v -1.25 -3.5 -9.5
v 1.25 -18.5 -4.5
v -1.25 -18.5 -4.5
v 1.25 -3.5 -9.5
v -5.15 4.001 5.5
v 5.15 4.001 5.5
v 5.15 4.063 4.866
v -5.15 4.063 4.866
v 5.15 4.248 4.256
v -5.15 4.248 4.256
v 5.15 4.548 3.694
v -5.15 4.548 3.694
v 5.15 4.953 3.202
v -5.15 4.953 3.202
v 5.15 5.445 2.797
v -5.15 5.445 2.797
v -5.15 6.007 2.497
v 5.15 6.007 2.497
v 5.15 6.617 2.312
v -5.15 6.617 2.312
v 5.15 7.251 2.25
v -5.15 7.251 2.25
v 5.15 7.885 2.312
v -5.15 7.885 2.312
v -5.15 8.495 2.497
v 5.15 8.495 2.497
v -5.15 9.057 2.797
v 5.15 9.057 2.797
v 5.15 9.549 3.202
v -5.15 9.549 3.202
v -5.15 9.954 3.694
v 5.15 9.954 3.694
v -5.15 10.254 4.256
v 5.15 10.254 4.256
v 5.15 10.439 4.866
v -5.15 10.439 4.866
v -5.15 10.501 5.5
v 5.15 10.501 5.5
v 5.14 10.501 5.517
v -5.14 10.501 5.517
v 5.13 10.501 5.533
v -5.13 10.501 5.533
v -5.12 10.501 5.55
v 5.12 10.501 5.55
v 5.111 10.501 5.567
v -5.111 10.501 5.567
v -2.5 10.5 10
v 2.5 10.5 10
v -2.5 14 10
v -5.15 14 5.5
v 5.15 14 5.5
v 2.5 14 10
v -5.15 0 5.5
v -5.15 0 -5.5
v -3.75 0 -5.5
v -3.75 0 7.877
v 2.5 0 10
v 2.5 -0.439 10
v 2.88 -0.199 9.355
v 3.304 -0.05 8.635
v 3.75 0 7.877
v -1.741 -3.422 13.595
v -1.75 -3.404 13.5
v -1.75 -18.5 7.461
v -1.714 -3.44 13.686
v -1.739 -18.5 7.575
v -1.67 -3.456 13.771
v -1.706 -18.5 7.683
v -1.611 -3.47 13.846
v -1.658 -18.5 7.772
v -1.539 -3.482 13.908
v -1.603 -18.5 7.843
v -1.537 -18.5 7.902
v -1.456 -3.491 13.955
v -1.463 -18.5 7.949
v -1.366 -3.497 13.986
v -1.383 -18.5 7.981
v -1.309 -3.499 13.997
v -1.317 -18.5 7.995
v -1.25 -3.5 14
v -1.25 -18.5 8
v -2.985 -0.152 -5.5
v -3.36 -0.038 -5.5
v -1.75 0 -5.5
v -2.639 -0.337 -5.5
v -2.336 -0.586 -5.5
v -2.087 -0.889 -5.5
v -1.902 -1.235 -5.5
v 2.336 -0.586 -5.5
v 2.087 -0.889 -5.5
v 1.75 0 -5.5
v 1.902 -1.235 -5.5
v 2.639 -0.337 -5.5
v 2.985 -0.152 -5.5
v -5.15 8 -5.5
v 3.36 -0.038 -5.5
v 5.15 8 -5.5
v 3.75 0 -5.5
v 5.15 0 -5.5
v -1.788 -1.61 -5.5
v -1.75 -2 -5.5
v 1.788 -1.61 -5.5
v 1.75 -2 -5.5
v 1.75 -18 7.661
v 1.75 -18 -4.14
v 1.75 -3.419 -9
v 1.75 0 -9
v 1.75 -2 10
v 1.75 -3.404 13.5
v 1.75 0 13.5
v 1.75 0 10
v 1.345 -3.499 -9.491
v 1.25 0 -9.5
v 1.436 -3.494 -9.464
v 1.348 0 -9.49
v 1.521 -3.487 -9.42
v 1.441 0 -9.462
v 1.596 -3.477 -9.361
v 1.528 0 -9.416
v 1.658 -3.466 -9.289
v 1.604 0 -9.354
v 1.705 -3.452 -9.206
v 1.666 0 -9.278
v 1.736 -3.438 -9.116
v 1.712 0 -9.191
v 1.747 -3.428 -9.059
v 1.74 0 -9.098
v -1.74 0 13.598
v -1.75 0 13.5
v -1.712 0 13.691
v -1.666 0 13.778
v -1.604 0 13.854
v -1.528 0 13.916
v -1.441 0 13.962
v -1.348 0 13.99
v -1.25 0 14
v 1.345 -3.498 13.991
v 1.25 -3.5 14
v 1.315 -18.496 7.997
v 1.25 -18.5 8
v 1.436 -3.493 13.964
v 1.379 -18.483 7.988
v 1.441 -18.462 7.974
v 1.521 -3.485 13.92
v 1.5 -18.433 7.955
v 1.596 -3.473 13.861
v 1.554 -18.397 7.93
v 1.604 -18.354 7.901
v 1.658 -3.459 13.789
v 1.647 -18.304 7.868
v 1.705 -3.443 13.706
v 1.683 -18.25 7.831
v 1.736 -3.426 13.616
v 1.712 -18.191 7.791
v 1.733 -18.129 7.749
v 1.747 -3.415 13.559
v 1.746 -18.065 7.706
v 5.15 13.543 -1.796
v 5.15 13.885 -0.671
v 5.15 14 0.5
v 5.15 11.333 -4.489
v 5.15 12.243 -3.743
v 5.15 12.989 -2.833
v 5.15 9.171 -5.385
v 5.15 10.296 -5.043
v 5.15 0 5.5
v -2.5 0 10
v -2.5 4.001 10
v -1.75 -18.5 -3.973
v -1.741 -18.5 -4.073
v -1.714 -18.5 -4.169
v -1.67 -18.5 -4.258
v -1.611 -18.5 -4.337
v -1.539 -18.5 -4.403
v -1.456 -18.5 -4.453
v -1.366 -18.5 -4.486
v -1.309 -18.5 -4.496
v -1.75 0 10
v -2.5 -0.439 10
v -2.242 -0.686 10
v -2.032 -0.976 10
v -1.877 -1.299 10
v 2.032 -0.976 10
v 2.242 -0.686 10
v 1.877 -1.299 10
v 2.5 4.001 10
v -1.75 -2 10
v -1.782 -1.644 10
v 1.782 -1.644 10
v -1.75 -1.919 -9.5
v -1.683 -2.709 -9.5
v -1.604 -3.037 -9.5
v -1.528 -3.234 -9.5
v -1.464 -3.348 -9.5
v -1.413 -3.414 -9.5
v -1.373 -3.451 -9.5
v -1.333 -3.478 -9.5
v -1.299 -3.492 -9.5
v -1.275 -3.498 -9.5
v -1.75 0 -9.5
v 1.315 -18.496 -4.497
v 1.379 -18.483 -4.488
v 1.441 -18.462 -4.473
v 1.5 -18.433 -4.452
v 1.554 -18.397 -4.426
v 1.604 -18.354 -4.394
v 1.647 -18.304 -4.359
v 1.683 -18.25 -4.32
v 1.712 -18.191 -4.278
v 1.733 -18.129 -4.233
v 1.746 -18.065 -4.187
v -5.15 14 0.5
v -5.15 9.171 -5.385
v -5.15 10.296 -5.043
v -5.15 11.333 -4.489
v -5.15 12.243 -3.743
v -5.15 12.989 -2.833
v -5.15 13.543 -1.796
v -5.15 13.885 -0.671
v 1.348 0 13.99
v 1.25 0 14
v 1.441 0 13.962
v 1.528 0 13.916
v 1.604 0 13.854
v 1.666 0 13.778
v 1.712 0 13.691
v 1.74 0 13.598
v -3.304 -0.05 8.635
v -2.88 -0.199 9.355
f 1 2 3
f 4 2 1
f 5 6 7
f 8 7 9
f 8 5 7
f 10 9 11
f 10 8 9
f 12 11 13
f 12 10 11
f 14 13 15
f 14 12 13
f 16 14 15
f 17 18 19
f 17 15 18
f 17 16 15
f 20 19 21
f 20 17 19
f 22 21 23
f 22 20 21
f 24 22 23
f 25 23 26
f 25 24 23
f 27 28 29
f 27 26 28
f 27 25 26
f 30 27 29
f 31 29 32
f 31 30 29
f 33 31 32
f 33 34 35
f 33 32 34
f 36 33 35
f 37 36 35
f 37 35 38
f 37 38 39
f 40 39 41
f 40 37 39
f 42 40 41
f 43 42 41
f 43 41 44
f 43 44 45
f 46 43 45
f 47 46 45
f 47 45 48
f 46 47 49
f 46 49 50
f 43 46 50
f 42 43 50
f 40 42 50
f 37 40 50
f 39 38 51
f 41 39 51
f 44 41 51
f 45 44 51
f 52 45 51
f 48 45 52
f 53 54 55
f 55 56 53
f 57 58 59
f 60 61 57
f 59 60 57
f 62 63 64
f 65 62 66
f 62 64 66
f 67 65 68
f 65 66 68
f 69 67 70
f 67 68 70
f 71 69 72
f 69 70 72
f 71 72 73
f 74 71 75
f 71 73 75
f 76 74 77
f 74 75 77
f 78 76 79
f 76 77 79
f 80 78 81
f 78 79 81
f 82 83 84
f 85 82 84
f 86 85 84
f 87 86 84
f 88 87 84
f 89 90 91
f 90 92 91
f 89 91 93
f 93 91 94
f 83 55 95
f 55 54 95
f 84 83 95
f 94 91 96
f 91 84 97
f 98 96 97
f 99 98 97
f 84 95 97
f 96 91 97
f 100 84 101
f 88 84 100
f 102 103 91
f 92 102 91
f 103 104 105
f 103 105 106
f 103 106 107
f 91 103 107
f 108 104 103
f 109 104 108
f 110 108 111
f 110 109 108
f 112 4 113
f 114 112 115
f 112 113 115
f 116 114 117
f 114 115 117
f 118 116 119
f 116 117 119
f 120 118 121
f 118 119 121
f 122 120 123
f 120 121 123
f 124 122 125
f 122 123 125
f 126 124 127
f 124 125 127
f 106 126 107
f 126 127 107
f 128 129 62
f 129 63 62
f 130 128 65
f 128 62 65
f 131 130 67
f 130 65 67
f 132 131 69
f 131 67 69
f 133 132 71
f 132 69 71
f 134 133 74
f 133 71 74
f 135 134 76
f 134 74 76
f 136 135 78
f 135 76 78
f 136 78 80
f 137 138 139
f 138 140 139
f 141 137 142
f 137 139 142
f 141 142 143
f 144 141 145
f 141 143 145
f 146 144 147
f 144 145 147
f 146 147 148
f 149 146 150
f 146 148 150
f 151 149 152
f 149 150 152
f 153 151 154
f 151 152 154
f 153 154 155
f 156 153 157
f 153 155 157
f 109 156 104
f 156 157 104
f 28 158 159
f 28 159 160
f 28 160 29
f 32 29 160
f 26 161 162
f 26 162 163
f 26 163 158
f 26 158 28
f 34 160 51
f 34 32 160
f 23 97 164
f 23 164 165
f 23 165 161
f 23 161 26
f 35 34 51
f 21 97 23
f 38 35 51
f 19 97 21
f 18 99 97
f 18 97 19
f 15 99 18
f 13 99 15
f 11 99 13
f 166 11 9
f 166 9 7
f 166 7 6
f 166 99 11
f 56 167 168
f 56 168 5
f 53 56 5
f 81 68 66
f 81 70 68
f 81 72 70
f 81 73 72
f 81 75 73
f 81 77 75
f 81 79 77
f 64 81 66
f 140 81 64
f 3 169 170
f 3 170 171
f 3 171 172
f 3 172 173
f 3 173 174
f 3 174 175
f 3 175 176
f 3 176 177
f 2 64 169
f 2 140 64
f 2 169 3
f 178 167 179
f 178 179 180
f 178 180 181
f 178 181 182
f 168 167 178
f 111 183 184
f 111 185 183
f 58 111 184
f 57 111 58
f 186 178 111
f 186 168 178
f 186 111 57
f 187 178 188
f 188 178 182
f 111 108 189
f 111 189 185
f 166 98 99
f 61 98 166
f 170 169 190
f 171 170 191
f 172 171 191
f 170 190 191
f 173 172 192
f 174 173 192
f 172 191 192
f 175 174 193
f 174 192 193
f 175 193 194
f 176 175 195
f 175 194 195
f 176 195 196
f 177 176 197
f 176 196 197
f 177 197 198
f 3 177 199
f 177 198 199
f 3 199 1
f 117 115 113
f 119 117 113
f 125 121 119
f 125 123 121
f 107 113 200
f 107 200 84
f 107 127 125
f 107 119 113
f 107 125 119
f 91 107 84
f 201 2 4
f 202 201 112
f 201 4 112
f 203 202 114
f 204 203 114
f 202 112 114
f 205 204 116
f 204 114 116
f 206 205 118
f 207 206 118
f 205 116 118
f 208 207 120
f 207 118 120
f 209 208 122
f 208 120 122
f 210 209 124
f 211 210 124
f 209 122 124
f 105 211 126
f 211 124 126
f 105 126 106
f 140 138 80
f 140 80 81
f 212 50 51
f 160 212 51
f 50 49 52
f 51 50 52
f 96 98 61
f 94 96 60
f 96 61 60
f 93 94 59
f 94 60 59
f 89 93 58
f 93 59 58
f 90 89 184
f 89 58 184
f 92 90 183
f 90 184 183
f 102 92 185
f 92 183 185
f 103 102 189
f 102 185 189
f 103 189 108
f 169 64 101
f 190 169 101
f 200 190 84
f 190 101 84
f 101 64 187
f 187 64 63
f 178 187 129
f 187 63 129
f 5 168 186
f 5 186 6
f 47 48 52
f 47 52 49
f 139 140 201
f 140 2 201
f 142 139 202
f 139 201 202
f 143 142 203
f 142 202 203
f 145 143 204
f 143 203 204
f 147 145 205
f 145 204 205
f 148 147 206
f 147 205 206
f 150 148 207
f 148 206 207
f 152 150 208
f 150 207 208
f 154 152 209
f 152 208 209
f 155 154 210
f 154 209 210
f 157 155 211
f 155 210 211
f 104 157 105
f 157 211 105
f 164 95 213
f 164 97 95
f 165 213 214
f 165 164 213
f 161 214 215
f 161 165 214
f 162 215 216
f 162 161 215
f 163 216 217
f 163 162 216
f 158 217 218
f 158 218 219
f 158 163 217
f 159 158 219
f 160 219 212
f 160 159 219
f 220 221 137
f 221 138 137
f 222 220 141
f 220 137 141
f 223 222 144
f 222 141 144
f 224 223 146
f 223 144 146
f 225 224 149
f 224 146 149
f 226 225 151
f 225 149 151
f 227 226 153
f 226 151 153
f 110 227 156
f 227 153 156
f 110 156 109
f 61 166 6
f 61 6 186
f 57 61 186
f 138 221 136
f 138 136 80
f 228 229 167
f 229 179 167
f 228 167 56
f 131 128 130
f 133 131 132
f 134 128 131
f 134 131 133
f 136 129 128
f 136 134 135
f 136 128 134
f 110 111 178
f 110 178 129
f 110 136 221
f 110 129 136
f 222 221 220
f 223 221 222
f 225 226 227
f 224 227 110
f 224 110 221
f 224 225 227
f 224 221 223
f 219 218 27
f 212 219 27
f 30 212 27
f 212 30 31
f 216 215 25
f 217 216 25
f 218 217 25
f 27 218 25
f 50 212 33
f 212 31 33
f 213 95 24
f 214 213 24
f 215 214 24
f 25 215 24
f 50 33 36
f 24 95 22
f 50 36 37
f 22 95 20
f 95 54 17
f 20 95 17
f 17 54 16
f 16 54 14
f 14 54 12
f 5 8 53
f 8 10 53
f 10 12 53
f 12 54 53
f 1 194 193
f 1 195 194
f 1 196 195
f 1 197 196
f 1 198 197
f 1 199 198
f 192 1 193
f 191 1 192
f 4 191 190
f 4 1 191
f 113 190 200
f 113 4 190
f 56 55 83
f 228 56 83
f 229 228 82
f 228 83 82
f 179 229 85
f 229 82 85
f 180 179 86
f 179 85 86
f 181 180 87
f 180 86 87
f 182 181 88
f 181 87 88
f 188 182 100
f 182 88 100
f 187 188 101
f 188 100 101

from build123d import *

# Parameters (mm, degrees)
F0_W          = 5.15
F0_H          = 11
F1_DEPTH      = 14
F3_DEPTH      = 5.151
F3_DEPTH_BACK = 5.151
F5_DEPTH      = 1.75
F6_R          = 6
F7_T4_DEPTH   = 15.5
F7_T9_DEPTH   = 15.5
F8_R          = 0.5


# Not quite as in the source:
# - a fillet or chamfer that OpenCascade refuses, or shapes differently, is made with other operations: its cross-section is extruded or revolved along the edge and cut away or added


with BuildPart() as f1:
    # F0 (on Front) → F1 (new body)
    with BuildSketch(Plane.XZ):
        with Locations((2.575, 0)):
            Rectangle(F0_W, F0_H)
        Polygon((0, 5.5), (5.15, 5.5), (2.5, 10), (0, 10), align=None)
        with Locations((-2.575, 0)):
            Rectangle(F0_W, F0_H)
        Polygon((-5.15, 5.5), (0, 5.5), (0, 10), (-2.5, 10), align=None)
    extrude(amount=-F1_DEPTH)

    # F2 (on Right) → F3 (cut, two sides)
    with BuildSketch(Plane.YZ) as f3_sk:
        with BuildLine():
            Line((4.0006404915, 10), (4.0006404915, 5.5))
            ThreePointArc((4.0006404915, 5.5), (7.2844648336, 2.2498275803), (10.5006404915, 5.5669554351))
            Line((10.5006404915, 5.5669554351), (10.5, 10))
            Line((10.5, 10), (4.0006404915, 10))
        make_face()
    extrude(amount=F3_DEPTH, mode=Mode.SUBTRACT)
    extrude(f3_sk.sketch, amount=-F3_DEPTH_BACK, mode=Mode.SUBTRACT)

    # F4 (on Right) → F5 (join, symmetric)
    with BuildSketch(Plane.YZ):
        Polygon((0, -9.5), (0, 0), (0, 14), (-3.5, 14), (-18.5, 8), (-18.5, -4.5), (-3.5, -9.5), align=None)
    extrude(amount=F5_DEPTH, both=True)

    # F6
    f6_edges = [f1.edges().sort_by_distance(p)[0] for p in [
        (0, 14, -5.5),
    ]]
    fillet(f6_edges, radius=F6_R)

    # F7: fillet of radius 2 on 2 edges, made by hand


with BuildPart() as f7_tool2:
    # F7_s3 → F7_t4 (new body)
    with BuildSketch(Plane.XY.offset(10)):
        with BuildLine():
            ThreePointArc((3.75, 0), (2.3357864376, -0.5857864376), (1.75, -2))
            Line((1.75, -2), (1.75, 0))
            Line((1.75, 0), (3.75, 0))
        make_face()
    extrude(amount=-F7_T4_DEPTH)

    split(bisect_by=Plane(origin=(6.2288019067, 0, 3.6680722339), x_dir=(0, 1, 0), z_dir=(-0.8616879874, 0, -0.5074384814)), keep=Keep.TOP)


with BuildPart() as f1_1:
    add(f1.part)

    # F7_t1: union F7_tool2
    add(f7_tool2.part)


with BuildPart() as f7_tool7:
    # F7_s8 → F7_t9 (new body)
    with BuildSketch(Plane.XY.offset(-5.5)):
        with BuildLine():
            ThreePointArc((-3.75, 0), (-2.3357864376, -0.5857864376), (-1.75, -2))
            Line((-1.75, -2), (-1.75, 0))
            Line((-1.75, 0), (-3.75, 0))
        make_face()
    extrude(amount=F7_T9_DEPTH)

    split(bisect_by=Plane(origin=(-6.2288019067, 0, 3.6680722339), x_dir=(0, 1, 0), z_dir=(0.8616879874, 0, -0.5074384814)), keep=Keep.TOP)


with BuildPart() as f1_2:
    add(f1_1.part)

    # F7_t6: union F7_tool7
    add(f7_tool7.part)

    # F8
    f8_edges = [f1_2.edges().sort_by_distance(p)[0] for p in [
        (1.75, -11, 11),
        (1.75, -1.75, 14),
        (1.75, -18.5, 1.75),
        (1.75, -11, -7),
        (1.75, -1.75, -9.5),
        (-1.75, -11, 11),
        (-1.75, -1.75, 14),
        (-1.75, -11, -7),
    ]]
    fillet(f8_edges, radius=F8_R)


solid = f1_2.part
